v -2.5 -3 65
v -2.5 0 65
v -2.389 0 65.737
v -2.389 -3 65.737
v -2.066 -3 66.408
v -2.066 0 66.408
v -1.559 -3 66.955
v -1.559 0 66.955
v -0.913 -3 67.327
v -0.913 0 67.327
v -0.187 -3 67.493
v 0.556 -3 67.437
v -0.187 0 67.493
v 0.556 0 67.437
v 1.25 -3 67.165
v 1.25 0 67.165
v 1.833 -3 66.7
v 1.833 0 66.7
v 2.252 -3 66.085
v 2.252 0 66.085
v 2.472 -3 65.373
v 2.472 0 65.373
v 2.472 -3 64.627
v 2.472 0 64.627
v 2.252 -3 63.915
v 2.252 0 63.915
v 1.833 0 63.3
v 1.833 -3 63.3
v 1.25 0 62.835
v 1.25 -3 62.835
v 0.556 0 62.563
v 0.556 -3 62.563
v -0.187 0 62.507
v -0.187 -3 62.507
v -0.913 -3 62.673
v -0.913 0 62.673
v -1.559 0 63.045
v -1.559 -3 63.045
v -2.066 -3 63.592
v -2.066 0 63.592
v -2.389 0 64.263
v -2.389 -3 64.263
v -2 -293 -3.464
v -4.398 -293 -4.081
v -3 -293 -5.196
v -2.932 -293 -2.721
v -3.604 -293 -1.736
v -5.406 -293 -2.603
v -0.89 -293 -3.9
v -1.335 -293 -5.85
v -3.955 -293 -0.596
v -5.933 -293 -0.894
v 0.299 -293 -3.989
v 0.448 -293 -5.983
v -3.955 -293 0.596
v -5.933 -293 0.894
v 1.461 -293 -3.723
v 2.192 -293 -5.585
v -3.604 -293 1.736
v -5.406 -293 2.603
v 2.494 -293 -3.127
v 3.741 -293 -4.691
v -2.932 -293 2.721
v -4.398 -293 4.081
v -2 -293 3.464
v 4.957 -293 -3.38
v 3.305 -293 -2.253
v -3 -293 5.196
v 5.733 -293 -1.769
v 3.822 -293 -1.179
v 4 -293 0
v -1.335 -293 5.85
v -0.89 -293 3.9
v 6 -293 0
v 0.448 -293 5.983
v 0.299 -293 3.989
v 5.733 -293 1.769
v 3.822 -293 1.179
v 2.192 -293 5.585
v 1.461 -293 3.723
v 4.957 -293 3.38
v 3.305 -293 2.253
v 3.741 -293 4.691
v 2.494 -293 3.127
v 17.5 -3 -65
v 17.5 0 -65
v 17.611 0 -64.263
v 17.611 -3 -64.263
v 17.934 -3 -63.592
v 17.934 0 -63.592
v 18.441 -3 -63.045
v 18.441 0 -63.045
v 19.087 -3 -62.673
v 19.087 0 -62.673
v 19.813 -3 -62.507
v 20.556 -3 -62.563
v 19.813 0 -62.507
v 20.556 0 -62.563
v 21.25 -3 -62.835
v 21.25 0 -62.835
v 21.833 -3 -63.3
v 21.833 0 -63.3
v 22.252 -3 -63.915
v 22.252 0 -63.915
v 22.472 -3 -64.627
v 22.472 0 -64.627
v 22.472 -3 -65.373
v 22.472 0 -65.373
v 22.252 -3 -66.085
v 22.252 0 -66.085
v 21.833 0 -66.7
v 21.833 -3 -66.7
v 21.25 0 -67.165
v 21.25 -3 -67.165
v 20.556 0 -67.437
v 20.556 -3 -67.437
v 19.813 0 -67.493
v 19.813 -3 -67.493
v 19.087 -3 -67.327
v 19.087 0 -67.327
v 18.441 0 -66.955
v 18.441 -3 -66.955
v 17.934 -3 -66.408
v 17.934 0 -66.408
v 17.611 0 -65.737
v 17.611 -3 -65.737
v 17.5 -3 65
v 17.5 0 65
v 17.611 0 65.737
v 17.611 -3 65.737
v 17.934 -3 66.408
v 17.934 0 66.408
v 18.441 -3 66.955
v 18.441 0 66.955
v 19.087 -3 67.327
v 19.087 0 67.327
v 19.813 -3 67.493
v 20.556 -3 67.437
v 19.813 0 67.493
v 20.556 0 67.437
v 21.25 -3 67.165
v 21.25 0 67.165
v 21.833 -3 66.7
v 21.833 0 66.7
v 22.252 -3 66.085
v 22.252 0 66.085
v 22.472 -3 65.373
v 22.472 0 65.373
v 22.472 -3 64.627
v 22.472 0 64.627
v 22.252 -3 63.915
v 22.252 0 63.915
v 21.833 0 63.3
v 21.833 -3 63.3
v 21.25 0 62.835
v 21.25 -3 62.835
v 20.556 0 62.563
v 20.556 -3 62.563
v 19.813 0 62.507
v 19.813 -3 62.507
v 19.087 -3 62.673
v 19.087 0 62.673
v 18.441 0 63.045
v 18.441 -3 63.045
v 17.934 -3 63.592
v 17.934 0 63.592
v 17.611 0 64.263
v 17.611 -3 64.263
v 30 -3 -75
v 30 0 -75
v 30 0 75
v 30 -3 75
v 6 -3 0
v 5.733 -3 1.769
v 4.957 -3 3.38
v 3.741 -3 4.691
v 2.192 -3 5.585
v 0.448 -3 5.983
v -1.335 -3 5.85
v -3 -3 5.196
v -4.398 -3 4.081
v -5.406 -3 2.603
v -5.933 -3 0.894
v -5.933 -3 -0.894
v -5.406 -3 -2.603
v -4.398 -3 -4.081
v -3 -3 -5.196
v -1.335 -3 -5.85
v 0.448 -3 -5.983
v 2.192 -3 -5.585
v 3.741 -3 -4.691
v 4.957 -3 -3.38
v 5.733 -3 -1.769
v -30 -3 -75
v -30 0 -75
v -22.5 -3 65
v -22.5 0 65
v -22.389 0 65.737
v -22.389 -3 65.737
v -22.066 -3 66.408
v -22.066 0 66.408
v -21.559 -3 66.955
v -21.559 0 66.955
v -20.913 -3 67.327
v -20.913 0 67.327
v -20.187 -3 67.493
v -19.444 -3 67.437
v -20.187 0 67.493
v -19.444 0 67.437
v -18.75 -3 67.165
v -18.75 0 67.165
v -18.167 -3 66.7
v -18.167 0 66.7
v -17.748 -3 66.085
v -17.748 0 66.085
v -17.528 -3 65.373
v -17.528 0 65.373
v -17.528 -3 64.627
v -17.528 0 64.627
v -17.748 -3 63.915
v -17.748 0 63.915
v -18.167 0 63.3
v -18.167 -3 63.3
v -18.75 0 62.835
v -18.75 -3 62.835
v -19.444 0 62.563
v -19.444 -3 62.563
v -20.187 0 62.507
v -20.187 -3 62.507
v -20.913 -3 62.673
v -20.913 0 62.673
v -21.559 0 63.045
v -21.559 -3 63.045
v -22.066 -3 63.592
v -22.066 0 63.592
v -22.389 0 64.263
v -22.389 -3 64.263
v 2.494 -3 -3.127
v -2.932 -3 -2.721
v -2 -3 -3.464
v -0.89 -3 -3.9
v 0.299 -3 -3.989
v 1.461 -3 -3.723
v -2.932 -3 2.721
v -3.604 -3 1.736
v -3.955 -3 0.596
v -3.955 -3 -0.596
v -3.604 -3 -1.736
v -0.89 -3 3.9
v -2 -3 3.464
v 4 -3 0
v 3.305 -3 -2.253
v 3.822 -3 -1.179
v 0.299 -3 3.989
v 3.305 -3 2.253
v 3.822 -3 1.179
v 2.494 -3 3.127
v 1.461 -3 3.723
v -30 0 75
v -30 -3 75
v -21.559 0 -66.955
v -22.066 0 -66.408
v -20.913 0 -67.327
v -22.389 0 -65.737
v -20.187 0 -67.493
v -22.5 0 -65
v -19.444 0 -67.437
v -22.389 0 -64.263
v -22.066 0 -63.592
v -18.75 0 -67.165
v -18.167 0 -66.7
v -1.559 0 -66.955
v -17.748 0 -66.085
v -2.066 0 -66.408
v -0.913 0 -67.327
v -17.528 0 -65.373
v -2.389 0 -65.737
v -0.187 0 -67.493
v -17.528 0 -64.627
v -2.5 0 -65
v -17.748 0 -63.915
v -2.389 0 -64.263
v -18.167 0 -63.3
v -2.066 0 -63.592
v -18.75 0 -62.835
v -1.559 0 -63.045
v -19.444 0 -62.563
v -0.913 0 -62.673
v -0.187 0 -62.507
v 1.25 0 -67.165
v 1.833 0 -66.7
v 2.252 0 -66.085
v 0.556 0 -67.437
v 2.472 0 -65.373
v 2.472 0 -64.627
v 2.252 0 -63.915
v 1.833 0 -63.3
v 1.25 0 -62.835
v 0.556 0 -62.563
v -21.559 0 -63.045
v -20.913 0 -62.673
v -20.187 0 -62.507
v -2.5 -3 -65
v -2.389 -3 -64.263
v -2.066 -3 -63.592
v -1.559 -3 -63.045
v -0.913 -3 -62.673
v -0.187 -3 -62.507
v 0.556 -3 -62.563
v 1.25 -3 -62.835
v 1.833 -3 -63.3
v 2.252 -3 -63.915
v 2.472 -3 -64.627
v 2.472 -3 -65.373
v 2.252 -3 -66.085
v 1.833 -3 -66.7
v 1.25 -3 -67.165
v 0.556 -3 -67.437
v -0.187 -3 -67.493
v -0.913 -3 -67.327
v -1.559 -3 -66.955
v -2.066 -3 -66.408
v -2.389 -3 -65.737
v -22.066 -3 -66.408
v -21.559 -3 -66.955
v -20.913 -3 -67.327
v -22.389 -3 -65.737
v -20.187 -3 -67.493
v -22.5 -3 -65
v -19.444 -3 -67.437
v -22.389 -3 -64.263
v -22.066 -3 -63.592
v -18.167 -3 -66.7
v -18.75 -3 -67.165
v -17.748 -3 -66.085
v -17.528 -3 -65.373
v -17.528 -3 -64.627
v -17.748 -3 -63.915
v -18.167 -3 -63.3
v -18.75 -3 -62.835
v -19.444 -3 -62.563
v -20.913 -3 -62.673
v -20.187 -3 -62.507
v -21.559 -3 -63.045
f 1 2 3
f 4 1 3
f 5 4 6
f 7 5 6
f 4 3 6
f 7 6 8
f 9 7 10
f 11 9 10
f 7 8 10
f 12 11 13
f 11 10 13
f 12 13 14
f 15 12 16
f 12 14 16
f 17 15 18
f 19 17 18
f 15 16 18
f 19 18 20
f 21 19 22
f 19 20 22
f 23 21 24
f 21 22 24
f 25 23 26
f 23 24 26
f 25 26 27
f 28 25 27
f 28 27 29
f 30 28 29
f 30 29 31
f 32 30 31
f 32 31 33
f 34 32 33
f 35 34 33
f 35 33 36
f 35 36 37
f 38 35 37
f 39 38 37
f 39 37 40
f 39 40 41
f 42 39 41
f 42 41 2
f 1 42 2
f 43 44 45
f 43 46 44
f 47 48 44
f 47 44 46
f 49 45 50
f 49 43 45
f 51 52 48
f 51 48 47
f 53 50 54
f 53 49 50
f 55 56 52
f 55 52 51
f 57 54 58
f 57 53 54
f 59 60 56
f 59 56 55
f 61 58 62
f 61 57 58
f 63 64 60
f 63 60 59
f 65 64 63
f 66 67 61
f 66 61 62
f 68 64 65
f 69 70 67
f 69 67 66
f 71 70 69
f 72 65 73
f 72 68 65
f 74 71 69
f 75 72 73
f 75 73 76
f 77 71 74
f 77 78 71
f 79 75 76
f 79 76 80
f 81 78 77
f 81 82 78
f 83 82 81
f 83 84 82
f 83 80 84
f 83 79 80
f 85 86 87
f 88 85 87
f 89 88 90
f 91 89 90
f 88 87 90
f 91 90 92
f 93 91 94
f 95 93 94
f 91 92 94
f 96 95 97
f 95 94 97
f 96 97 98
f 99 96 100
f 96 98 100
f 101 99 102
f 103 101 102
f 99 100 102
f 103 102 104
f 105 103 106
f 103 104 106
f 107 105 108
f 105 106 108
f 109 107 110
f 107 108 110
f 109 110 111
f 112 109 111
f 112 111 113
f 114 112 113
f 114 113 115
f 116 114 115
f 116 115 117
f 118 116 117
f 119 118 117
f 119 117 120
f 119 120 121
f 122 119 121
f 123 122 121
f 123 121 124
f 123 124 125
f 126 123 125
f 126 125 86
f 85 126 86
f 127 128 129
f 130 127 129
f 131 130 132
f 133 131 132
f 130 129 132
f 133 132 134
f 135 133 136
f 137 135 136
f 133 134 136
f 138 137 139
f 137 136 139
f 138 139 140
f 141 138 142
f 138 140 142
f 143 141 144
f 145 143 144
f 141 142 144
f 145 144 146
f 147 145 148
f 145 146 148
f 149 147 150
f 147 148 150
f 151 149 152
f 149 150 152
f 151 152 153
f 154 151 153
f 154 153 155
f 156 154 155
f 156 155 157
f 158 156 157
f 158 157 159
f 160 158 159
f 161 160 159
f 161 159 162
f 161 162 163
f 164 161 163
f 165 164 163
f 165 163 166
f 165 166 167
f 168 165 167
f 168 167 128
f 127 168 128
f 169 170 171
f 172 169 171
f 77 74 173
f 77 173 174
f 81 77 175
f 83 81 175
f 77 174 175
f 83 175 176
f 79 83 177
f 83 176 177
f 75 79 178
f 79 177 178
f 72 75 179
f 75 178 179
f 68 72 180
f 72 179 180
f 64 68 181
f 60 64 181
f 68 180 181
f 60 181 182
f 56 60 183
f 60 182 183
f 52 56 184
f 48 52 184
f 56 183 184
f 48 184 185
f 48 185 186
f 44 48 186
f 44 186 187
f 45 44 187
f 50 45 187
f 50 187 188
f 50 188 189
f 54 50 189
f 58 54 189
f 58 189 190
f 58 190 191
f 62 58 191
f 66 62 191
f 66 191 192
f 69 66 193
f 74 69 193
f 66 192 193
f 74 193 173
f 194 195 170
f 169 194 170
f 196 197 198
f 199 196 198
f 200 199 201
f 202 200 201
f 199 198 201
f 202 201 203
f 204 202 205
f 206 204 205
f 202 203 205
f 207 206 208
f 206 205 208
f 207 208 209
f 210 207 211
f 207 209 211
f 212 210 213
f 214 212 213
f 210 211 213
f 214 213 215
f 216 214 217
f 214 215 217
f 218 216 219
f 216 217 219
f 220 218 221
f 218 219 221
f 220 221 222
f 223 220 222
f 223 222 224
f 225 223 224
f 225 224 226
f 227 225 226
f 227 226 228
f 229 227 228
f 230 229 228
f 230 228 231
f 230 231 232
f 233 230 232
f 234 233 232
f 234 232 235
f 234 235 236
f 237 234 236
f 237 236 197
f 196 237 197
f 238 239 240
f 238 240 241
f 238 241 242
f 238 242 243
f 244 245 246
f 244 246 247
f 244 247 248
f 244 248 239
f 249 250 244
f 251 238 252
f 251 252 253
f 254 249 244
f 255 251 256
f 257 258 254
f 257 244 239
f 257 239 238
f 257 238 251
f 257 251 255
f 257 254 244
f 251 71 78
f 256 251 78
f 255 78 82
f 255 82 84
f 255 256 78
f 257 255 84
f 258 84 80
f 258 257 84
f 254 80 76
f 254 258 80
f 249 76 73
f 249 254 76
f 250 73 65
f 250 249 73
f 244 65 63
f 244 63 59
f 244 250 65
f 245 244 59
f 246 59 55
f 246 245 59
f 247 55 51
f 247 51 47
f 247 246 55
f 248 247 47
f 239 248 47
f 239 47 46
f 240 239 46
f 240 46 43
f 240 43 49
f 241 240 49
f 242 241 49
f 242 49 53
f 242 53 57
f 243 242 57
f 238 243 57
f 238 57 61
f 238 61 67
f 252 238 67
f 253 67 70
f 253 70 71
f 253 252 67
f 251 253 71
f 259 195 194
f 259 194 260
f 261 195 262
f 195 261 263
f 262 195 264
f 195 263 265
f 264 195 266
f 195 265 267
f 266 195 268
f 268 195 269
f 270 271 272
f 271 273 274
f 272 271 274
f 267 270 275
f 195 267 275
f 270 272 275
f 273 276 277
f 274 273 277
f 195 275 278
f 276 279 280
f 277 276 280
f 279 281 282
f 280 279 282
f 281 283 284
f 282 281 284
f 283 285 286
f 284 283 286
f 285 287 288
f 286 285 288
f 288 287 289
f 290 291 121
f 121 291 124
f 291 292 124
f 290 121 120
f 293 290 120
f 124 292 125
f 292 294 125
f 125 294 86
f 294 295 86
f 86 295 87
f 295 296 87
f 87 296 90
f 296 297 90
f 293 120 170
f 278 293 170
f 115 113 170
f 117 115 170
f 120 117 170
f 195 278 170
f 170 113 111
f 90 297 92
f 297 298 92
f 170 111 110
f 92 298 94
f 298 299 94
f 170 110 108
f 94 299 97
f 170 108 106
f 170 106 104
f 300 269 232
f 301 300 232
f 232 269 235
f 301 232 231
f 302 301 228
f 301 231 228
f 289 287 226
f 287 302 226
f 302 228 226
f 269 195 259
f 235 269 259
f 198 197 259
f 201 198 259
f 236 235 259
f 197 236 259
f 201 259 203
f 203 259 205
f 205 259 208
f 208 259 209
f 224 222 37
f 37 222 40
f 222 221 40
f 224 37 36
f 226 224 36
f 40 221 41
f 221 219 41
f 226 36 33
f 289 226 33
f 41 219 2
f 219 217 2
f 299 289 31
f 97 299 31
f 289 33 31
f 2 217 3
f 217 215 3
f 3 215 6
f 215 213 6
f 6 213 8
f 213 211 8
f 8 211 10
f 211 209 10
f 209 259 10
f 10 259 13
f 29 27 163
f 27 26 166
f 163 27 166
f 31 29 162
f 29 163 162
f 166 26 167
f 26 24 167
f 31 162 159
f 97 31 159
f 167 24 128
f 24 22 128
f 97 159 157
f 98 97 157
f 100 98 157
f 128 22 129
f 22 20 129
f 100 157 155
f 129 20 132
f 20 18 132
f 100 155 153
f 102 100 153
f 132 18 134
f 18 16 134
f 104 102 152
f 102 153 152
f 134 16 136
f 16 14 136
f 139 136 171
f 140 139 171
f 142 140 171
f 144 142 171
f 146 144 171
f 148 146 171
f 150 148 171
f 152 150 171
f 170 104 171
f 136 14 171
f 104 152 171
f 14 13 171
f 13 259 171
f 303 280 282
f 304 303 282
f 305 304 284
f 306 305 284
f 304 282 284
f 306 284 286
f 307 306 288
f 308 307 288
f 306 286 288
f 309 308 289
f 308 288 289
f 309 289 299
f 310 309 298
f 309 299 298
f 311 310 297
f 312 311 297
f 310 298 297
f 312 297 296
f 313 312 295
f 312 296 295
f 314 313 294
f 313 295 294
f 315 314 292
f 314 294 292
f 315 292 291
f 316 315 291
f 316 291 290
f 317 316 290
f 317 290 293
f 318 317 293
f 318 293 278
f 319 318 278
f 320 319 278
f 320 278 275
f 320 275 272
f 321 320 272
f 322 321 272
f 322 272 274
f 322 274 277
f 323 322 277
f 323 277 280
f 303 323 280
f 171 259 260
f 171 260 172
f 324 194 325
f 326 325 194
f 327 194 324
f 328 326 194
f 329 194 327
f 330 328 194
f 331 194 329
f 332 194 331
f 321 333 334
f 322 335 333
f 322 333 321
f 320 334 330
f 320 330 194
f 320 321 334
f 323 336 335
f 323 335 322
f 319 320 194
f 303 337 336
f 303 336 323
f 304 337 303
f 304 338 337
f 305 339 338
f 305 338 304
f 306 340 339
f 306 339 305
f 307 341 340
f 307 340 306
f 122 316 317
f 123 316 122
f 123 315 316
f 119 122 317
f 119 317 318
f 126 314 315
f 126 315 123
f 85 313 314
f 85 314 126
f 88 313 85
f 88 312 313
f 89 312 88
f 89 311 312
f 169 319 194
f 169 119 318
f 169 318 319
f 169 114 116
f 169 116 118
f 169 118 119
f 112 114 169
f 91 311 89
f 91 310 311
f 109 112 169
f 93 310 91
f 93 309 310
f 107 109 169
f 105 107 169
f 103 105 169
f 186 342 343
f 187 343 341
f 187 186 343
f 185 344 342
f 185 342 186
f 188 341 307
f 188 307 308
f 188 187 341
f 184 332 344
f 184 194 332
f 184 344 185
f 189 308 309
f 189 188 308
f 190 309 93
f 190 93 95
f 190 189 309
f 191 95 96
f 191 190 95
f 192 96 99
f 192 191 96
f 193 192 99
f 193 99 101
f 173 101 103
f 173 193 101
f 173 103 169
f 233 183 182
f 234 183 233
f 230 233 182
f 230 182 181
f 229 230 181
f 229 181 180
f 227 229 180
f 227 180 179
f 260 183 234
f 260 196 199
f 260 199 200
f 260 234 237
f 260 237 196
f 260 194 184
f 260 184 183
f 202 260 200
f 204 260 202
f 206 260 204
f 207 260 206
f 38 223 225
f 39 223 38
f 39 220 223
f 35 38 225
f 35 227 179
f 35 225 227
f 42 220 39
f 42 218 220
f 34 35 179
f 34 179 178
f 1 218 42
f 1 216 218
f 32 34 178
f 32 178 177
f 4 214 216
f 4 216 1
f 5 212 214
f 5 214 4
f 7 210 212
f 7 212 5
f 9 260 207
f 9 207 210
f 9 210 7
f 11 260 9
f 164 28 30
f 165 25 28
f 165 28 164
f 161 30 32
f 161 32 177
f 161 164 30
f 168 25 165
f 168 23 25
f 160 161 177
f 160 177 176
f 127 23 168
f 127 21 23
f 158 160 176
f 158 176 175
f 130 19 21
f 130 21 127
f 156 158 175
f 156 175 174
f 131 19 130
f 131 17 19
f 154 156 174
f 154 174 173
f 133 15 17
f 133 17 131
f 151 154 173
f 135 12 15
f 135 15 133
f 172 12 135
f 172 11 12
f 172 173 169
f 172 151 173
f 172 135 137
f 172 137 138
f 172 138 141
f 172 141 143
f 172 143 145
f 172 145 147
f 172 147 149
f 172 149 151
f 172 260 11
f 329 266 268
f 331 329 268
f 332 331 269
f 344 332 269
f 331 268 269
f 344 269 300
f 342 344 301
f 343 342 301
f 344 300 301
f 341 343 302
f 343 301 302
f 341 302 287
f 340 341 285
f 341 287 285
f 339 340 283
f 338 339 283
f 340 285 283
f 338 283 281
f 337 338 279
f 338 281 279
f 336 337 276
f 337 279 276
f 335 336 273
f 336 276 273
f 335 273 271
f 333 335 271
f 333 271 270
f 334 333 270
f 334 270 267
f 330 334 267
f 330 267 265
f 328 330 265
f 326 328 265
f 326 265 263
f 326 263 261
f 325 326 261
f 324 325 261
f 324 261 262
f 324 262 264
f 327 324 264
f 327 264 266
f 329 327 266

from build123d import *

# Parameters (mm, degrees)
F0_W     = 60
F0_H     = 150
F1_DEPTH = 3
F2_R     = 6
F2_R_2   = 4
F3_DEPTH = 290
F5_D     = 5


with BuildPart() as f1:
    # F0 (on Front) → F1 (new body)
    with BuildSketch(Plane.XZ):
        Rectangle(F0_W, F0_H)
    extrude(amount=F1_DEPTH)

    # F2 (on face) → F3 (join)
    with BuildSketch(Plane.XZ.offset(3)):
        Circle(F2_R)
        Circle(F2_R_2, mode=Mode.SUBTRACT)
    extrude(amount=F3_DEPTH)

    # F5 (through all)
    with Locations(Plane.XZ.offset(3)):
        with Locations((-20, 65), (0, 65), (20, 65), (20, -65), (0, -65), (-20, -65)):
            Hole(F5_D / 2)


solid = f1.part
